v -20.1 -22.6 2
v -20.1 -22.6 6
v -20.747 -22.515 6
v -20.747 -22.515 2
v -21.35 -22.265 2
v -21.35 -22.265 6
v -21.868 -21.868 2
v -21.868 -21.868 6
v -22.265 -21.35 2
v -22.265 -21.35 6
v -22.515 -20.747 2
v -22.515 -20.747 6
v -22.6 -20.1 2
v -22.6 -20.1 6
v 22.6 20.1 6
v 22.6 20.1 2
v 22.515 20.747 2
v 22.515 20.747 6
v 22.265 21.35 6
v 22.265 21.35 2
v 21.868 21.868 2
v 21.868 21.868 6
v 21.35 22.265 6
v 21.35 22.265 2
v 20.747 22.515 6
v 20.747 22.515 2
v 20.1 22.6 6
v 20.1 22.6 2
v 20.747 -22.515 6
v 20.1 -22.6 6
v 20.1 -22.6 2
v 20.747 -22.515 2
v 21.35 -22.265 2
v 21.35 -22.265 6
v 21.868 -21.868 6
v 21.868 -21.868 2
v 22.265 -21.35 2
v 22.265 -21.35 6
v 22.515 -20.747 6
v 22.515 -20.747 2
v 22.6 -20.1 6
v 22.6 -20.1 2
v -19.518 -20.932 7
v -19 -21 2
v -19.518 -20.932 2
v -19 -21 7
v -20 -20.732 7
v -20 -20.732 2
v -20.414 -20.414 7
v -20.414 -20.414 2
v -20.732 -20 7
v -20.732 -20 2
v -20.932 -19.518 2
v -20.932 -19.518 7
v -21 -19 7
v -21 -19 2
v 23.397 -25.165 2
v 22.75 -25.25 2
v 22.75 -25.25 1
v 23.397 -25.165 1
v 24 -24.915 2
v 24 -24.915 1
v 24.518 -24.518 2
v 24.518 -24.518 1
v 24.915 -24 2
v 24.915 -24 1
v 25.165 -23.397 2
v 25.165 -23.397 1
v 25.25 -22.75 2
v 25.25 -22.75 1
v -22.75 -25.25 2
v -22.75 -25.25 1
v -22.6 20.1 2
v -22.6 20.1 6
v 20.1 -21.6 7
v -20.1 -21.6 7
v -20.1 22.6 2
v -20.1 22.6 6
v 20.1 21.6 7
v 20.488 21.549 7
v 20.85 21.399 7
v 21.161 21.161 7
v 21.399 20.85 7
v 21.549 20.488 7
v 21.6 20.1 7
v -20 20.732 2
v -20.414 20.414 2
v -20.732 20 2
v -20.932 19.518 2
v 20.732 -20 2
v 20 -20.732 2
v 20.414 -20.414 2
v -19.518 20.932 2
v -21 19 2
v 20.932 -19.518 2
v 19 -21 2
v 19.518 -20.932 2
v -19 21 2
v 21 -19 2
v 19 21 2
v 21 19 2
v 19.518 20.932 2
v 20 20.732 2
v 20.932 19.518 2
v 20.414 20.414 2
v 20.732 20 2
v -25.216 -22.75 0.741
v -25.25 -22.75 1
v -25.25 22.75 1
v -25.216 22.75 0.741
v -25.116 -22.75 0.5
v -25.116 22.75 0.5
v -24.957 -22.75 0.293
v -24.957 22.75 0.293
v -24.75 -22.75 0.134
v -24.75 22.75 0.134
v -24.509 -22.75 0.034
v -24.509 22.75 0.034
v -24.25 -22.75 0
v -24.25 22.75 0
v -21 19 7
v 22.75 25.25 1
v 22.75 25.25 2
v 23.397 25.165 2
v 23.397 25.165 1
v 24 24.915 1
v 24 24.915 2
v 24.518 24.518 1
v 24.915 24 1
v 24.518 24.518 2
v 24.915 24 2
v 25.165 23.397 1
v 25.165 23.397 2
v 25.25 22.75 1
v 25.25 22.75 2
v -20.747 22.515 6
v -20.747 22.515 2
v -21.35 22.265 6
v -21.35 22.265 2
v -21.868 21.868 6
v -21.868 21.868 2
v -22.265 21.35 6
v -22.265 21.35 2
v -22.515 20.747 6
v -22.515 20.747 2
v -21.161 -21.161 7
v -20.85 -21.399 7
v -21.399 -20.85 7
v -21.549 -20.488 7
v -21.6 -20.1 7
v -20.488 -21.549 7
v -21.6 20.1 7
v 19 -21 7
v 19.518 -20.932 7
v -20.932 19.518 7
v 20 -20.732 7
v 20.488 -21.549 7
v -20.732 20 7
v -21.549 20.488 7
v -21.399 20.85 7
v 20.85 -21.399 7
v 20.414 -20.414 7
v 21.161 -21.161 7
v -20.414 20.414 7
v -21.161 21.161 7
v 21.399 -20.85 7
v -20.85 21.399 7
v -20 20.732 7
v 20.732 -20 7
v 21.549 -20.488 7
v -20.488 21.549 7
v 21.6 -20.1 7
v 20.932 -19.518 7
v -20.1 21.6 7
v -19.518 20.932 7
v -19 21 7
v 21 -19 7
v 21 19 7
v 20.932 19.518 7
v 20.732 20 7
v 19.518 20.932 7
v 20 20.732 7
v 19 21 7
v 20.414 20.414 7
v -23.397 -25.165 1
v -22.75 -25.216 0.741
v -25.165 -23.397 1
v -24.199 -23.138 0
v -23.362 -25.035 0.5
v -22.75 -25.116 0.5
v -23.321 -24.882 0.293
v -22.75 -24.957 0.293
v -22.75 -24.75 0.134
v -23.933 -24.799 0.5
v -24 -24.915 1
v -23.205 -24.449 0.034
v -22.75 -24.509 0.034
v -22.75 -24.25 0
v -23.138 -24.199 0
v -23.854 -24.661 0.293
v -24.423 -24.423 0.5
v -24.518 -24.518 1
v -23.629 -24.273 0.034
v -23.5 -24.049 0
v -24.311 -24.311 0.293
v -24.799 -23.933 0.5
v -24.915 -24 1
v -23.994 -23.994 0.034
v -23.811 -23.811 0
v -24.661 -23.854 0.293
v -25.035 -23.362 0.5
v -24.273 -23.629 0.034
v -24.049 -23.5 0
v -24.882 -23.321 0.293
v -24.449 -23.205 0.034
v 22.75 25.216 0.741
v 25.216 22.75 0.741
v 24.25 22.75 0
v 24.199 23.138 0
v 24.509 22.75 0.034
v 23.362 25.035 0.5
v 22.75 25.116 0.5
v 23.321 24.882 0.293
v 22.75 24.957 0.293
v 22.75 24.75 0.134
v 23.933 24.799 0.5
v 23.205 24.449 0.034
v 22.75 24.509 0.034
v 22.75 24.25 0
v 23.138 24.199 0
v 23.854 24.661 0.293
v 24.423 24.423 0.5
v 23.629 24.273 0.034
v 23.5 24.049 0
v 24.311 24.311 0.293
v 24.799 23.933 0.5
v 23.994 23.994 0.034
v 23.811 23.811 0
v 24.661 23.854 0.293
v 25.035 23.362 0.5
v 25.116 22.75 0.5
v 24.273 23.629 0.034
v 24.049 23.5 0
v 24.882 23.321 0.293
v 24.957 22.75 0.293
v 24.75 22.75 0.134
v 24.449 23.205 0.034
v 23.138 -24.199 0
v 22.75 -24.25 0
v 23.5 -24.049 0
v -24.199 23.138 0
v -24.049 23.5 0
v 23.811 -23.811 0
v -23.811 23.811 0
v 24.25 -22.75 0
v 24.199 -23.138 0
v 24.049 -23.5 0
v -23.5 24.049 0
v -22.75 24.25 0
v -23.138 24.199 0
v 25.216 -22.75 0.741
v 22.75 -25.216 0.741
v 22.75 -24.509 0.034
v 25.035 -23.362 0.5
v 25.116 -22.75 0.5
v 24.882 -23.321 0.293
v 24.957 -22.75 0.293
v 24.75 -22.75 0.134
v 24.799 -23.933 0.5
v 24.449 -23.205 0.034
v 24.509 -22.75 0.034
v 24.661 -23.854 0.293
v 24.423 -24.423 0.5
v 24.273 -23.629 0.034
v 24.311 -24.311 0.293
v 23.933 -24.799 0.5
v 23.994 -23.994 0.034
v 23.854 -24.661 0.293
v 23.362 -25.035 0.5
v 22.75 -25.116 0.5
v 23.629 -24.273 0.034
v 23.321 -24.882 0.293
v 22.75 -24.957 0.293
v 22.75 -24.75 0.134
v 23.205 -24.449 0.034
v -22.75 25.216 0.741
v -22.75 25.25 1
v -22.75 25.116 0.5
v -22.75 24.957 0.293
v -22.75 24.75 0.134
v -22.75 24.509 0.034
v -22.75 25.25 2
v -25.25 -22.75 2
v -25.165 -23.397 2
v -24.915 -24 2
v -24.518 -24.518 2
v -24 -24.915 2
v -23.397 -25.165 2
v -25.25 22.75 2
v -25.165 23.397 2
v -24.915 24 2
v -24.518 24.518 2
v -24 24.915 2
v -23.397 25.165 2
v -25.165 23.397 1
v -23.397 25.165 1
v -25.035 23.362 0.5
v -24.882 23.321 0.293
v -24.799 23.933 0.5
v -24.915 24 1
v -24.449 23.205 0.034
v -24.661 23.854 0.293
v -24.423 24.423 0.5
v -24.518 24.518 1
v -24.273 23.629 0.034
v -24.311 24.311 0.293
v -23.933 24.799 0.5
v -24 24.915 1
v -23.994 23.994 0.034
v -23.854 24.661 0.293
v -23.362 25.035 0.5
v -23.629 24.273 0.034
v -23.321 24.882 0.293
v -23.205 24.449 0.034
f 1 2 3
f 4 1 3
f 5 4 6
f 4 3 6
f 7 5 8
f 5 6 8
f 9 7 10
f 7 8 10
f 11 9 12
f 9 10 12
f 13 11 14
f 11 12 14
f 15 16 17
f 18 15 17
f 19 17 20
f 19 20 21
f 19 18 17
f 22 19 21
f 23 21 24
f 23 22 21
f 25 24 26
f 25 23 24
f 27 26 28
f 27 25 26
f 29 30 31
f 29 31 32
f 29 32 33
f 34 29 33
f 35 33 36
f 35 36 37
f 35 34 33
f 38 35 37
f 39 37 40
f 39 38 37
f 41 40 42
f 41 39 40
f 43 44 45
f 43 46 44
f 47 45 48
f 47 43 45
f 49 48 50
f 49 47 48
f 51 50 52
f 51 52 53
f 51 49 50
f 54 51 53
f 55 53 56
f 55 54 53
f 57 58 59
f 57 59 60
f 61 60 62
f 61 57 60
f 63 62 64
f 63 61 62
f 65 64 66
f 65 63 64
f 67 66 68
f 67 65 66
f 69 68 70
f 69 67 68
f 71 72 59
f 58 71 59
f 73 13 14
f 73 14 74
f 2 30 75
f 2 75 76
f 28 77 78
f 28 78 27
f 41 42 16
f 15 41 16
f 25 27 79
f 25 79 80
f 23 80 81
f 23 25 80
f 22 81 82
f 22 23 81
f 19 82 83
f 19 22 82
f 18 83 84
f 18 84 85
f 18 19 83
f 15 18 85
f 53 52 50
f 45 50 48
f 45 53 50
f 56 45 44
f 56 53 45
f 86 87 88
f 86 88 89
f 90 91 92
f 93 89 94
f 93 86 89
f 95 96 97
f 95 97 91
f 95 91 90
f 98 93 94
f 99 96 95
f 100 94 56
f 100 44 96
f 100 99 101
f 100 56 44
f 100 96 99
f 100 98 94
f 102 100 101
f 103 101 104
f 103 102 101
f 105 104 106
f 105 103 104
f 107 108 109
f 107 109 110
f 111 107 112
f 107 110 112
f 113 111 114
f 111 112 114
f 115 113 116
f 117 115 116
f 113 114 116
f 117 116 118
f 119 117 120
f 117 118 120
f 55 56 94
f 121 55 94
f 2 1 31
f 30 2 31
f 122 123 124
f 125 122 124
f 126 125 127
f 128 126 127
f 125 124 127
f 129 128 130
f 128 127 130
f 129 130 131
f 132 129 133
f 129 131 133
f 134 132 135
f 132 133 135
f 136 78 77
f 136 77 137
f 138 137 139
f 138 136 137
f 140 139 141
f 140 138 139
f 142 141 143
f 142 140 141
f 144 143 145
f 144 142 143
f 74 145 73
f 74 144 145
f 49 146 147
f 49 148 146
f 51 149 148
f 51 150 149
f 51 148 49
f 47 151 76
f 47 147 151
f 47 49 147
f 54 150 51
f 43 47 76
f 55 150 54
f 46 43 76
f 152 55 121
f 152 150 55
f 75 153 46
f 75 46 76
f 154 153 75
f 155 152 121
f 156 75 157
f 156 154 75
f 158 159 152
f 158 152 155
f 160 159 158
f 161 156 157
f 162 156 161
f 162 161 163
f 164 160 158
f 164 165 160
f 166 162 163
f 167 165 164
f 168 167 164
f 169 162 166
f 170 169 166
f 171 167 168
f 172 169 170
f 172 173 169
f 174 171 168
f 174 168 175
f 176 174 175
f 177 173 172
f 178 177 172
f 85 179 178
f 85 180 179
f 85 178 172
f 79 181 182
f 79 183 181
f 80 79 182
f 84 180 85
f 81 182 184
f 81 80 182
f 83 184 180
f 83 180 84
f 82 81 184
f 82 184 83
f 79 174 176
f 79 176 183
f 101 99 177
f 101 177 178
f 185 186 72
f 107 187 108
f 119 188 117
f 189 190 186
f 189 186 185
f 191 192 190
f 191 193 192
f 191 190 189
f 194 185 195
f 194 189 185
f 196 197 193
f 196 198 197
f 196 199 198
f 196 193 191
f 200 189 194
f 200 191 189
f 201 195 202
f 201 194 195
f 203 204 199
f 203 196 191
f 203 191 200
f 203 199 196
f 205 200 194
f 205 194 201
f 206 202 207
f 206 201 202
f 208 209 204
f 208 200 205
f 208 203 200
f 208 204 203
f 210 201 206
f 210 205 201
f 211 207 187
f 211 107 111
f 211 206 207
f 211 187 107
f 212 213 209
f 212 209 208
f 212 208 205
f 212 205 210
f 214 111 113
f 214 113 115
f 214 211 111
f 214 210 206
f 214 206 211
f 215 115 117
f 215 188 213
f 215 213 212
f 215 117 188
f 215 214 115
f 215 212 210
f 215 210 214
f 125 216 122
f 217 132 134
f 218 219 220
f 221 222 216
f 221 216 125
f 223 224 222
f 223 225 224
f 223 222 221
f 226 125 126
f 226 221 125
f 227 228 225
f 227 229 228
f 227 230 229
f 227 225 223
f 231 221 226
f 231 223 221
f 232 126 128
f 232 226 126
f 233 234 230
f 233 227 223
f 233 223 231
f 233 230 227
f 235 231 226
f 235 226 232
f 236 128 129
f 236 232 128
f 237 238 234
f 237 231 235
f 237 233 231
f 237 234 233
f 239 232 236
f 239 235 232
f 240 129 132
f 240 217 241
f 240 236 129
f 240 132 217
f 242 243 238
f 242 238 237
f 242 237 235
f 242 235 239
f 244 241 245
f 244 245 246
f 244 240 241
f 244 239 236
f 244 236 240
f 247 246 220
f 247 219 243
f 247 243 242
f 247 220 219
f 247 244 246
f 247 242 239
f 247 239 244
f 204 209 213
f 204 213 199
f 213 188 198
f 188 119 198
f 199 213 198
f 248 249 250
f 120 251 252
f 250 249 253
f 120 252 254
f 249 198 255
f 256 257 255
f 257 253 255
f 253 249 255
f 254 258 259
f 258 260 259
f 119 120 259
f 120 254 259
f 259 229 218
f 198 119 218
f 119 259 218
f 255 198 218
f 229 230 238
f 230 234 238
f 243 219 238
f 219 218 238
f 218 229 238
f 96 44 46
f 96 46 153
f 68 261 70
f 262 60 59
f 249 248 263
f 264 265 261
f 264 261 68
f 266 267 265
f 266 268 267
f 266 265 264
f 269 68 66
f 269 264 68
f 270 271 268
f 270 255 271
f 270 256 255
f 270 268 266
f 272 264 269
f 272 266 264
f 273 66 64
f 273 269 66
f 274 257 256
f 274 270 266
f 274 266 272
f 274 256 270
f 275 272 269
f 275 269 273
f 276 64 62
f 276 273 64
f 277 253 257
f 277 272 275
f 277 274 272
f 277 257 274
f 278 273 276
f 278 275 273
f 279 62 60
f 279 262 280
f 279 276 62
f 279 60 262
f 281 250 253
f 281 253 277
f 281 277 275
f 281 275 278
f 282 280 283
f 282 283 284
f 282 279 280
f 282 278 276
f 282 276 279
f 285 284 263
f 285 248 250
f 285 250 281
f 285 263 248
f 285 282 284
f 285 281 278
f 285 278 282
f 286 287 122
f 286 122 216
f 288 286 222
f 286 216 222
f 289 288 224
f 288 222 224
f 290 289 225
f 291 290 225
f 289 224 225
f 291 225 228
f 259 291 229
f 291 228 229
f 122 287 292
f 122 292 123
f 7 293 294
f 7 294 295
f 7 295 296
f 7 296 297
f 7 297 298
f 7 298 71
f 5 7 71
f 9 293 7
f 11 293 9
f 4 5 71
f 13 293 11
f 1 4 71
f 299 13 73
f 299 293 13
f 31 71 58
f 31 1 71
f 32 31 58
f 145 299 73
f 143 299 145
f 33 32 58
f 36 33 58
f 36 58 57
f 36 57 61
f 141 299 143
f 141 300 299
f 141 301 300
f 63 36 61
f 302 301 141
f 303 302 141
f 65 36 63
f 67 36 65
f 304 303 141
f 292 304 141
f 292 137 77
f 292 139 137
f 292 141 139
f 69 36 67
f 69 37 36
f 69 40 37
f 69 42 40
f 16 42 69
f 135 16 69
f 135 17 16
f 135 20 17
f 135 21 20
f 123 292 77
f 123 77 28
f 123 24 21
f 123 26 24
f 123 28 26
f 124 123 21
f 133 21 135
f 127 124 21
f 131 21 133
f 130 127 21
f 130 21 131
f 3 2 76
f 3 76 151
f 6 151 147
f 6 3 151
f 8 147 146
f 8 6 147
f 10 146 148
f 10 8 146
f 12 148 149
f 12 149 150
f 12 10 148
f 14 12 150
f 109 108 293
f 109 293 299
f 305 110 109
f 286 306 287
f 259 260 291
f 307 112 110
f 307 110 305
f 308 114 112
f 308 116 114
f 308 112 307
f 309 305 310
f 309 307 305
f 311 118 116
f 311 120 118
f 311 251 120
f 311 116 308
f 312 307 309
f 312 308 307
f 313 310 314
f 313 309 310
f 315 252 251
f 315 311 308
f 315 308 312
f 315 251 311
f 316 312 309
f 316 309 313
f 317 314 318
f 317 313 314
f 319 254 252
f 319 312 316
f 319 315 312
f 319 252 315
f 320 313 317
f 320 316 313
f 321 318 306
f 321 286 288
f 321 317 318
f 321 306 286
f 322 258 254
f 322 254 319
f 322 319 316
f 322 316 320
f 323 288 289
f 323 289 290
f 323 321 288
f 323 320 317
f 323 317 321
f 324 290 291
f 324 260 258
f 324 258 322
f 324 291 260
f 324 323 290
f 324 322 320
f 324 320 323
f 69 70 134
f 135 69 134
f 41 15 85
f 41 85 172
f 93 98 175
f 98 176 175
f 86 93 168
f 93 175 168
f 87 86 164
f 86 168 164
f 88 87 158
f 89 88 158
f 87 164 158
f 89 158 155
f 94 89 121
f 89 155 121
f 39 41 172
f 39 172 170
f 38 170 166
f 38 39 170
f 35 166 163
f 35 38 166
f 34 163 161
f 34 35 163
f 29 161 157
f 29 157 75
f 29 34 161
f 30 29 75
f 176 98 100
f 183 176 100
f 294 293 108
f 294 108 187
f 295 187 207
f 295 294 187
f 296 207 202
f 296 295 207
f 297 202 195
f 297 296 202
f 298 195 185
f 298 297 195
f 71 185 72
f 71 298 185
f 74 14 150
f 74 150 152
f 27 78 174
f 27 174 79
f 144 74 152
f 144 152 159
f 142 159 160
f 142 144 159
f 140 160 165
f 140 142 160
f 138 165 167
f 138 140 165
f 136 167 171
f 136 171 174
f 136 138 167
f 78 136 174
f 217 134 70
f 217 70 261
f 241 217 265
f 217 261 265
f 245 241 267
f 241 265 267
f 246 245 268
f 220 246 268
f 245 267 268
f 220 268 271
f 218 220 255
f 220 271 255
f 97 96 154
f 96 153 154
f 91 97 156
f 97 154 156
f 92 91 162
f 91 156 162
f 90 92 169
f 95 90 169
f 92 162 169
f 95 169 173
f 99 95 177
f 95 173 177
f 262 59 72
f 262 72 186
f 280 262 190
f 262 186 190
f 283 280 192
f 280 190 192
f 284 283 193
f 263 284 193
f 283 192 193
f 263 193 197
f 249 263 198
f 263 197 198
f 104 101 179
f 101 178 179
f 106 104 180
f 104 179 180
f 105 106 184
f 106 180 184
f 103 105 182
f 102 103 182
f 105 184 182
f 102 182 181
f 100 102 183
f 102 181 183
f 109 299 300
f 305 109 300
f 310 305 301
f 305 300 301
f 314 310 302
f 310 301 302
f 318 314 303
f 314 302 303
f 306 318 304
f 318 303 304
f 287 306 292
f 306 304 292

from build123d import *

# Parameters (mm, degrees)
F0_W     = 50.5
F0_H     = 50.5
F1_DEPTH = 2
F2_W     = 45.2
F2_H     = 45.2
F3_DEPTH = 5
F4_W     = 42
F4_H     = 42
F5_DEPTH = 5
F6_R     = 2.5
F7_R     = 2
F8_SIZE  = 1
F9_R     = 1


with BuildPart() as f1:
    # F0 (on Top) → F1 (new body)
    with BuildSketch(Plane.XY):
        Rectangle(F0_W, F0_H)
    extrude(amount=F1_DEPTH)

    # F2 (on face) → F3 (join)
    with BuildSketch(Plane.XY.offset(2)):
        Rectangle(F2_W, F2_H)
    extrude(amount=F3_DEPTH)

    # F4 (on face) → F5 (cut, through all)
    with BuildSketch(Plane.XY.offset(2)):
        Rectangle(F4_W, F4_H)
    extrude(amount=F5_DEPTH, mode=Mode.SUBTRACT)

    # F6
    f6_edges = [f1.edges().sort_by_distance(p)[0] for p in [
        (-25.25, 25.25, 1),
        (-25.25, -25.25, 1),
        (25.25, -25.25, 1),
        (25.25, 25.25, 1),
        (-22.6, 22.6, 4.5),
        (-22.6, -22.6, 4.5),
        (22.6, -22.6, 4.5),
        (22.6, 22.6, 4.5),
    ]]
    fillet(f6_edges, radius=F6_R)

    # F7
    f7_edges = [f1.edges().sort_by_distance(p)[0] for p in [
        (-21, 21, 4.5),
        (21, 21, 4.5),
        (21, -21, 4.5),
        (-21, -21, 4.5),
    ]]
    fillet(f7_edges, radius=F7_R)

    # F8
    f8_edges = [f1.edges().sort_by_distance(p)[0] for p in [
        (-22.6, 0, 7),
    ]]
    chamfer(f8_edges, length=F8_SIZE)

    # F9
    f9_edges = [f1.edges().sort_by_distance(p)[0] for p in [
        (0, 25.25, 0),
    ]]
    fillet(f9_edges, radius=F9_R)


solid = f1.part
